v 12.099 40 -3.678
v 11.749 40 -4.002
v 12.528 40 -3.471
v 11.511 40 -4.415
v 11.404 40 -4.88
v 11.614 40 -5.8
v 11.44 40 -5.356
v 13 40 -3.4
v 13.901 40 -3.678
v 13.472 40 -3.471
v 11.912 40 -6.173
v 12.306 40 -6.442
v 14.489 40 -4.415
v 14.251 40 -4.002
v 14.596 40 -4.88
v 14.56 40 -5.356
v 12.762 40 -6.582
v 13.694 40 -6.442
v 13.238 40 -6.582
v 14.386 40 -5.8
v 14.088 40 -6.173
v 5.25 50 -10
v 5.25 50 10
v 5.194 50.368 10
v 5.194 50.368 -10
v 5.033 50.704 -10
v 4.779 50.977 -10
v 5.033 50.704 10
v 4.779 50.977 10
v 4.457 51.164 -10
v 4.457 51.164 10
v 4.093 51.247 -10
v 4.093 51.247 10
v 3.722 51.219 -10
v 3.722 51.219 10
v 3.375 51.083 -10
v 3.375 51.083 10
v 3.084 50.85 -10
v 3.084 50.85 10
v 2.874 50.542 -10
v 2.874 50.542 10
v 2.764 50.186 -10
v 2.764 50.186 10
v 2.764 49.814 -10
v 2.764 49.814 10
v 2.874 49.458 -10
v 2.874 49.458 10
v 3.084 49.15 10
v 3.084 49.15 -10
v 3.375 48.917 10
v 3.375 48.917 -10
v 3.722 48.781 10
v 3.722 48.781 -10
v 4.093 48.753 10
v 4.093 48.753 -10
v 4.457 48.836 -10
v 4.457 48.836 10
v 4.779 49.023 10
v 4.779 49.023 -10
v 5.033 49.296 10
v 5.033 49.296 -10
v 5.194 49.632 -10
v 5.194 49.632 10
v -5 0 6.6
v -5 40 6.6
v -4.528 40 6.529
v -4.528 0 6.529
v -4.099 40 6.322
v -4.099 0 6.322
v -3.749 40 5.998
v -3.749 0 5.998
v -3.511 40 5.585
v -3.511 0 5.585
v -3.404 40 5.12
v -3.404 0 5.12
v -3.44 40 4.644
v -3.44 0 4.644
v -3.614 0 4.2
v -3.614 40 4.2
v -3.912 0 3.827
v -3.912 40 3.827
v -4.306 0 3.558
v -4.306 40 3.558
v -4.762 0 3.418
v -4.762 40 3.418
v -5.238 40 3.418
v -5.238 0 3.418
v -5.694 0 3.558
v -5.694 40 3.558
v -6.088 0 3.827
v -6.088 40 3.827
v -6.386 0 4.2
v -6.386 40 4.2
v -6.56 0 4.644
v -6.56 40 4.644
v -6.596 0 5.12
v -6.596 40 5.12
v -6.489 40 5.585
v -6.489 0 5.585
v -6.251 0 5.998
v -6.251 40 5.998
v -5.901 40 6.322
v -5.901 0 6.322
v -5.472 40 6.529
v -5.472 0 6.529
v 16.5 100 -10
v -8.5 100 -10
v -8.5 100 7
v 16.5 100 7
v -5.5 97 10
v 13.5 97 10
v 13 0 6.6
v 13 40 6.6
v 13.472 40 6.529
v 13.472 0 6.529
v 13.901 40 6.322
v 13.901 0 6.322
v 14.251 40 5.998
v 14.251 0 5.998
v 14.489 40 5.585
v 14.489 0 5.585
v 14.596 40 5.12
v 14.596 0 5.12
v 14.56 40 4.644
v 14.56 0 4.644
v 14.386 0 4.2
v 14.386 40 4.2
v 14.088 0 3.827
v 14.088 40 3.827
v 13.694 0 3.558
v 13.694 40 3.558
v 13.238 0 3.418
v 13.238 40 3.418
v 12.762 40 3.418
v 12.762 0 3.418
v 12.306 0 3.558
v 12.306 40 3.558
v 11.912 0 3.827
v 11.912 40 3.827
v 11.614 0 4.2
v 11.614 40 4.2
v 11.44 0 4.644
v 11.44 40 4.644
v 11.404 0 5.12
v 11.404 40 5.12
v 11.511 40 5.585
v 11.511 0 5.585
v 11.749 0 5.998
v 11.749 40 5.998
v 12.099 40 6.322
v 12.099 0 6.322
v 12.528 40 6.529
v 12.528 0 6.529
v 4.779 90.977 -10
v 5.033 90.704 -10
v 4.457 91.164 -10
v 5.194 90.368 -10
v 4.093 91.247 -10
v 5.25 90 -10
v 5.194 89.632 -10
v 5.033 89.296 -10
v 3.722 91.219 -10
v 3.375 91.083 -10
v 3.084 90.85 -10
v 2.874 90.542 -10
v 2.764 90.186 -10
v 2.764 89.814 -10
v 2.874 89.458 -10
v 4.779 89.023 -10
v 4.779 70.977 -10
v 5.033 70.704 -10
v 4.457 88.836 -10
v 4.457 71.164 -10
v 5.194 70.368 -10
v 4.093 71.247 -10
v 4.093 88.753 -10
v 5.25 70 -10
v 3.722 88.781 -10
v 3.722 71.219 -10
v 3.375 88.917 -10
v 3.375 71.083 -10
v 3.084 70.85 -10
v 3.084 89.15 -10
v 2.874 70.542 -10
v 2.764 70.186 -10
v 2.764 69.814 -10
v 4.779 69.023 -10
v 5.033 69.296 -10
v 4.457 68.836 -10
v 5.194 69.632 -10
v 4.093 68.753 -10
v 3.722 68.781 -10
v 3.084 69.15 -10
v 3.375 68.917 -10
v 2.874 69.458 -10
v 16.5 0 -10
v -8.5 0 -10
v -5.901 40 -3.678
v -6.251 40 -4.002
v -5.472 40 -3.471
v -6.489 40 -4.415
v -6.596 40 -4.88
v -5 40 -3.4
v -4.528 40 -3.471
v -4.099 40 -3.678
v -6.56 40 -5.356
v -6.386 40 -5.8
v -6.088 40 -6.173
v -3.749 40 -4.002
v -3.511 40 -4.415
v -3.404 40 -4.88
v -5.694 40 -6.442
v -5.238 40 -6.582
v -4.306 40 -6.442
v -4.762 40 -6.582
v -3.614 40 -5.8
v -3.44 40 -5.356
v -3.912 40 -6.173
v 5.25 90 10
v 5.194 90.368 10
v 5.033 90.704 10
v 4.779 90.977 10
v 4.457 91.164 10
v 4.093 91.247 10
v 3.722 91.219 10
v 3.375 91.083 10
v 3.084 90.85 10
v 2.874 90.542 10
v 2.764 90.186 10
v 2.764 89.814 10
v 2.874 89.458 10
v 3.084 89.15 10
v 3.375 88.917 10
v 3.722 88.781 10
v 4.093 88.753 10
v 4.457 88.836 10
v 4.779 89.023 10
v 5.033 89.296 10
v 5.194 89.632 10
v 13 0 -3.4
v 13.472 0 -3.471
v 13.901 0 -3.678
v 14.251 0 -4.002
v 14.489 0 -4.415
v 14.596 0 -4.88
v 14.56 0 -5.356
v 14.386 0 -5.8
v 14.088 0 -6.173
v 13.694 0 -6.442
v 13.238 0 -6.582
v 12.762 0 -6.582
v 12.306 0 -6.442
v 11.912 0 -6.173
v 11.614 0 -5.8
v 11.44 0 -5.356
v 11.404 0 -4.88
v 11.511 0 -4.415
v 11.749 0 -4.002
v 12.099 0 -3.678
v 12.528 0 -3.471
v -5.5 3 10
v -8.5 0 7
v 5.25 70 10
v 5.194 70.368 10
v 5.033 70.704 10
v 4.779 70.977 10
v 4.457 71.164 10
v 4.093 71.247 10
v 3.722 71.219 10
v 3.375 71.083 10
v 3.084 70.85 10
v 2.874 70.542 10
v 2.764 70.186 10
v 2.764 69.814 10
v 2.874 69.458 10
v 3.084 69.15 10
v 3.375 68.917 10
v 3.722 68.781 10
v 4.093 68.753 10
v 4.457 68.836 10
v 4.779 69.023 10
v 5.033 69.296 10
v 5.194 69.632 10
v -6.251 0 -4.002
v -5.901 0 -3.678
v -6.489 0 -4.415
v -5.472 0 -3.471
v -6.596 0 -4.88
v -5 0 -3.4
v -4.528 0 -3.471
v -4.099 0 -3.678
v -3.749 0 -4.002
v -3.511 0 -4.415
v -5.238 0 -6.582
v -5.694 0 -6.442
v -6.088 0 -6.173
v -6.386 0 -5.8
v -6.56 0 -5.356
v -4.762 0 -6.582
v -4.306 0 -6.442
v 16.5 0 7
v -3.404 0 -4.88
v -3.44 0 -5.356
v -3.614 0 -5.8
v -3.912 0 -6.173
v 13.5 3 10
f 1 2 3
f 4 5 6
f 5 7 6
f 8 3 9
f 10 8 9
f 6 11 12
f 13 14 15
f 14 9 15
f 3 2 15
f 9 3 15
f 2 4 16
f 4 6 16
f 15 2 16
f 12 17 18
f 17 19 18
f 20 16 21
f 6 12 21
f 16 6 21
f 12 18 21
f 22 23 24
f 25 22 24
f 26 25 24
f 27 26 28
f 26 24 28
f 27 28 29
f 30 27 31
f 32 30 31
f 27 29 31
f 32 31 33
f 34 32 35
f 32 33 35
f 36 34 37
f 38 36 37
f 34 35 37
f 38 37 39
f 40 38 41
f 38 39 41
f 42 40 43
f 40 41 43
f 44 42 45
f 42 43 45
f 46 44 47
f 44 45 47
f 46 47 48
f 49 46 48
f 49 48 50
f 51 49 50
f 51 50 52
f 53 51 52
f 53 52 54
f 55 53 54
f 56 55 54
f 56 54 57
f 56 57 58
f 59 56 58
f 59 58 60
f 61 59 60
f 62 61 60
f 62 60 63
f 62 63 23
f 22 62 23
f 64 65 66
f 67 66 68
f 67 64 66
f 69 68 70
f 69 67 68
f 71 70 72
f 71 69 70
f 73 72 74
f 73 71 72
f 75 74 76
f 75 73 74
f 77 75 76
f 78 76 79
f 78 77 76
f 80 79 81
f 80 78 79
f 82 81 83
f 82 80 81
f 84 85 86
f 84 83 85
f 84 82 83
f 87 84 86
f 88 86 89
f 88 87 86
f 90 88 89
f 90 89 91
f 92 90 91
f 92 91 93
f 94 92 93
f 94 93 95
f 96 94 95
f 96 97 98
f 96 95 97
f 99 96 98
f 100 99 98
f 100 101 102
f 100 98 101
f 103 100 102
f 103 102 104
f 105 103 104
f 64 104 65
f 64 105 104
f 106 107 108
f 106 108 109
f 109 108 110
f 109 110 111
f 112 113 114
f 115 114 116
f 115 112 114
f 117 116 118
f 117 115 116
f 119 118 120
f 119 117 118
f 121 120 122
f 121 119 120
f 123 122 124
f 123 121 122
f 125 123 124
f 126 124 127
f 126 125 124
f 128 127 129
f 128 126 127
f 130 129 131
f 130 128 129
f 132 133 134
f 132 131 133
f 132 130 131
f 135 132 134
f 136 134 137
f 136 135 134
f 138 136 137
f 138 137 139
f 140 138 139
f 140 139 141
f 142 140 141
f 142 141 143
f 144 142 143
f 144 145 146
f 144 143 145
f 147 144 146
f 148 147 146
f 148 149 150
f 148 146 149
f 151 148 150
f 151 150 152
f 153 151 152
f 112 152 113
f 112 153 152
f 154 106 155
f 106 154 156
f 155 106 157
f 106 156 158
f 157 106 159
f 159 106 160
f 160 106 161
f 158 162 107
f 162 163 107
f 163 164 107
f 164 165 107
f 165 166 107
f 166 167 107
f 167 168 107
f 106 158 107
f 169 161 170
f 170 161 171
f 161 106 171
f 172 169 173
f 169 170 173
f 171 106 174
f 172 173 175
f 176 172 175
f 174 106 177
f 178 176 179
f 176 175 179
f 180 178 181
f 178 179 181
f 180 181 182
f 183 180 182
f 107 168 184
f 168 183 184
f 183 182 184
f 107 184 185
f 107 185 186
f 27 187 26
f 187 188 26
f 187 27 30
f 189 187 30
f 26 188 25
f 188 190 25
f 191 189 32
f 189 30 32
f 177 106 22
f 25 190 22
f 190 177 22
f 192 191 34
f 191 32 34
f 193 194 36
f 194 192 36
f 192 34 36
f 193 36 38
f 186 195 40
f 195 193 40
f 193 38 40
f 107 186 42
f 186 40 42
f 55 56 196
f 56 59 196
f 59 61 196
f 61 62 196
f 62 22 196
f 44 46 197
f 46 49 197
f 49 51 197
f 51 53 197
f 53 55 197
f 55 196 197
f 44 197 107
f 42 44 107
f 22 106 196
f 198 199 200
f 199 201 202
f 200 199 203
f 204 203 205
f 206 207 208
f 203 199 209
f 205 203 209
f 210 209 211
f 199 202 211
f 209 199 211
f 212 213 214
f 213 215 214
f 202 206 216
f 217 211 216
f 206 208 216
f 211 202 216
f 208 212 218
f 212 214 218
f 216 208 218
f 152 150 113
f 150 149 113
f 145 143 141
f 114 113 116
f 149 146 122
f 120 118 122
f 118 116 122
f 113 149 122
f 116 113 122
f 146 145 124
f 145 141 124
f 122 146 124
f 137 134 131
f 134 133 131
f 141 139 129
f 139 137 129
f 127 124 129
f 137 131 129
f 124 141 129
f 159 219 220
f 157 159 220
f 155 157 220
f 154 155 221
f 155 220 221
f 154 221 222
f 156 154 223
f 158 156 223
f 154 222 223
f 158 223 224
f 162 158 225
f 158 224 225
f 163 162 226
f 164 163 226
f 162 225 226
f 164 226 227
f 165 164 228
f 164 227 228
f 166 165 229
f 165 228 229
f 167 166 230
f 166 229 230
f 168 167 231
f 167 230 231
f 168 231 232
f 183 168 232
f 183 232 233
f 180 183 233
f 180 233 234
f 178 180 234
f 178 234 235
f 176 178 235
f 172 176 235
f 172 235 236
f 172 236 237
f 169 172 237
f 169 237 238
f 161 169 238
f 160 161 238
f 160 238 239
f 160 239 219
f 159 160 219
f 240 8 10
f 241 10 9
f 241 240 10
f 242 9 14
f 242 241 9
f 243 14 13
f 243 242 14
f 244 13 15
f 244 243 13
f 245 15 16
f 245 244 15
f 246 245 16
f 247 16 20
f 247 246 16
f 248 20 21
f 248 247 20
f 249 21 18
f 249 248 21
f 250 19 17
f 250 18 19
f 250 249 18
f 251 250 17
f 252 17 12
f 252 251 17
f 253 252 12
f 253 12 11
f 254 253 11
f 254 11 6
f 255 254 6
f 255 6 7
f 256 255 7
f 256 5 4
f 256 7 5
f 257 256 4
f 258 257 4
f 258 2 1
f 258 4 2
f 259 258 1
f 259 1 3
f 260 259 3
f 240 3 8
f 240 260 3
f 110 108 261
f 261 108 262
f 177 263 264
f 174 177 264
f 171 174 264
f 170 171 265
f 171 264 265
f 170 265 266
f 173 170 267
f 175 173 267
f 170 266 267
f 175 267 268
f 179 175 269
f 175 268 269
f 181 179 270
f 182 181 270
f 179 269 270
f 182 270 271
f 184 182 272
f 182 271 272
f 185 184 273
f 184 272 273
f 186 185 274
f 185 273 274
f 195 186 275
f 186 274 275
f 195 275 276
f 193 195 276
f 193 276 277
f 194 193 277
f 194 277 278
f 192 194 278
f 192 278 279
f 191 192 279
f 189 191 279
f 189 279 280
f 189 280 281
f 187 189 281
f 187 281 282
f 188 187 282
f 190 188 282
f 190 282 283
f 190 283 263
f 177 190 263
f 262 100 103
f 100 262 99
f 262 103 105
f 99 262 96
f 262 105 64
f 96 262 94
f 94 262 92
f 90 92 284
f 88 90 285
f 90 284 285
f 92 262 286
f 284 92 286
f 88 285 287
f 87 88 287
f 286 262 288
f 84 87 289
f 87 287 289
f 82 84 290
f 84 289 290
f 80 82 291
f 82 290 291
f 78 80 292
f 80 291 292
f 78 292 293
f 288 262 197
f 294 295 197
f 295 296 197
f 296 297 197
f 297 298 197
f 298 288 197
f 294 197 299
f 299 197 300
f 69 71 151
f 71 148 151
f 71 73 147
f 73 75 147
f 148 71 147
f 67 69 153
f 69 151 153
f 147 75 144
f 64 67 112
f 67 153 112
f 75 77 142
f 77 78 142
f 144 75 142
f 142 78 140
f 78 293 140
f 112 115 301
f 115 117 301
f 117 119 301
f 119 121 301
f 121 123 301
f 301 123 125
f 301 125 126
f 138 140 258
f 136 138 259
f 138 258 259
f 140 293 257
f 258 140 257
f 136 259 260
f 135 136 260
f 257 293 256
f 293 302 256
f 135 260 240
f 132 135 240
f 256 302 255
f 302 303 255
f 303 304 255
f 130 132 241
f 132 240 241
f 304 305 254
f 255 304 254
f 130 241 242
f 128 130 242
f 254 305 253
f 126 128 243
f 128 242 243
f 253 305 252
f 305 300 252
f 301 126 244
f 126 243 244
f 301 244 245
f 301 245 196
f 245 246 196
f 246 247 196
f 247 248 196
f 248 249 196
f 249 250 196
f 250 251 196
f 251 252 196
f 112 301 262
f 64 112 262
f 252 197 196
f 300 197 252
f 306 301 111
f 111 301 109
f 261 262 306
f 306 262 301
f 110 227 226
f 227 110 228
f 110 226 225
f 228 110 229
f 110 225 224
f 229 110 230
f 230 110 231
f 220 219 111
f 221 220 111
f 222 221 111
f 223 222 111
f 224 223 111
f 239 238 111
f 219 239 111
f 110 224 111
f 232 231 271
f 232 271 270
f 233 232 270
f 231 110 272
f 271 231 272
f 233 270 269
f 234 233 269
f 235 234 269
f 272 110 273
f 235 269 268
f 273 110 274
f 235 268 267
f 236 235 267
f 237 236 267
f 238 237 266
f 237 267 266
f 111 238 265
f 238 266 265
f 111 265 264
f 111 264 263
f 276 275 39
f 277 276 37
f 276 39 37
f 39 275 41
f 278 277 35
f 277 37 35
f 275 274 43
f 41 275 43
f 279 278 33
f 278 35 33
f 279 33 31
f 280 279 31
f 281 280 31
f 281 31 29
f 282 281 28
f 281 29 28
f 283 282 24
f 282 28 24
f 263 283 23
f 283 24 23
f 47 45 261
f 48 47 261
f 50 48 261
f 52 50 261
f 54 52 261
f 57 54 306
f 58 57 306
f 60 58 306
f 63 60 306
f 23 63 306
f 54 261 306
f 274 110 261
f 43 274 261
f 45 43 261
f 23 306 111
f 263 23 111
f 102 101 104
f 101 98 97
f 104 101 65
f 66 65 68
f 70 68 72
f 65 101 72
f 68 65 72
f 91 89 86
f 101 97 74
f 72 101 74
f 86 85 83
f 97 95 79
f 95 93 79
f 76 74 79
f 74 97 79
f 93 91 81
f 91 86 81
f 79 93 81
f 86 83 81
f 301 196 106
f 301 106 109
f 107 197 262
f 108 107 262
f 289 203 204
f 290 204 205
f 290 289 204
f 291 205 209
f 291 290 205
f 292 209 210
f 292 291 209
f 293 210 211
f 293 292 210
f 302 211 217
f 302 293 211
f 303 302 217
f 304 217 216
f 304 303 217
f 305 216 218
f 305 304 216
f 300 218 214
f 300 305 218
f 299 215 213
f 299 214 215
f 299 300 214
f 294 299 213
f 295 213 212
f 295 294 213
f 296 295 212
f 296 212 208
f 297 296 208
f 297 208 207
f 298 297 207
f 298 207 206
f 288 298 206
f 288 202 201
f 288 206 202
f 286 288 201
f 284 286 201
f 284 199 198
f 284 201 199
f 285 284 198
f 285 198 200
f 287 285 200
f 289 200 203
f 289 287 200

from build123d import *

# Parameters (mm, degrees)
SKETCH1_R           = 1.6
BOSS_EXTRUDE1_DEPTH = 100
SKETCH2_W           = 8.75
SKETCH2_H           = 20
CUT_EXTRUDE1_DEPTH  = 100
SKETCH3_W           = 25
SKETCH3_H           = 20
BOSS_EXTRUDE2_DEPTH = 60
SKETCH4_R           = 1.25
CUT_EXTRUDE2_DEPTH  = 60
CHAMFER1_SIZE       = 3


with BuildPart() as part:
    # Sketch1 → Boss-Extrude1 (new body)
    with BuildSketch(Plane(origin=(0, 0, 0), x_dir=(1, 0, 0), z_dir=(0, 1, 0))):
        Polygon((-17.25, -10), (17.25, -10), (25.25, -10), (25.25, 10), (17.25, 10), (-17.25, 10), align=None)
        with Locations(Location((-5, 5, 0), (0, 0, 270))):
            Circle(SKETCH1_R, mode=Mode.SUBTRACT)
        with Locations(Location((13, 5, 0), (0, 0, 270))):
            Circle(SKETCH1_R, mode=Mode.SUBTRACT)
        with Locations(Location((-5, -5, 0), (0, 0, 270))):
            Circle(SKETCH1_R, mode=Mode.SUBTRACT)
        with Locations(Location((13, -5, 0), (0, 0, 270))):
            Circle(SKETCH1_R, mode=Mode.SUBTRACT)
    extrude(amount=BOSS_EXTRUDE1_DEPTH)

    # Sketch2 → Cut-Extrude1 (cut)
    with BuildSketch(Plane.XZ):
        with Locations((-12.875, 0)):
            Rectangle(SKETCH2_W, SKETCH2_H)
        with Locations((20.875, 0)):
            Rectangle(SKETCH2_W, SKETCH2_H)
    extrude(amount=-CUT_EXTRUDE1_DEPTH, mode=Mode.SUBTRACT)

    # Sketch3 → Boss-Extrude2 (add)
    with BuildSketch(Plane(origin=(0, 100, 0), x_dir=(1, 0, 0), z_dir=(0, 1, 0))):
        with Locations((4, 0)):
            Rectangle(SKETCH3_W, SKETCH3_H)
    extrude(amount=-BOSS_EXTRUDE2_DEPTH)

    # Sketch4 → Cut-Extrude2 (cut)
    with BuildSketch(Plane.XY.offset(10)):
        with Locations((4, 50)):
            Circle(SKETCH4_R)
        with Locations((4, 70)):
            Circle(SKETCH4_R)
        with Locations((4, 90)):
            Circle(SKETCH4_R)
    extrude(amount=-CUT_EXTRUDE2_DEPTH, mode=Mode.SUBTRACT)

    # Chamfer1
    chamfer1_edges = [part.edges().sort_by_distance(p)[0] for p in [
        (4, 0, 10),
        (4, 100, 10),
        (-8.5, 50, 10),
        (16.5, 50, 10),
    ]]
    chamfer(chamfer1_edges, length=CHAMFER1_SIZE)


solid = part.part
